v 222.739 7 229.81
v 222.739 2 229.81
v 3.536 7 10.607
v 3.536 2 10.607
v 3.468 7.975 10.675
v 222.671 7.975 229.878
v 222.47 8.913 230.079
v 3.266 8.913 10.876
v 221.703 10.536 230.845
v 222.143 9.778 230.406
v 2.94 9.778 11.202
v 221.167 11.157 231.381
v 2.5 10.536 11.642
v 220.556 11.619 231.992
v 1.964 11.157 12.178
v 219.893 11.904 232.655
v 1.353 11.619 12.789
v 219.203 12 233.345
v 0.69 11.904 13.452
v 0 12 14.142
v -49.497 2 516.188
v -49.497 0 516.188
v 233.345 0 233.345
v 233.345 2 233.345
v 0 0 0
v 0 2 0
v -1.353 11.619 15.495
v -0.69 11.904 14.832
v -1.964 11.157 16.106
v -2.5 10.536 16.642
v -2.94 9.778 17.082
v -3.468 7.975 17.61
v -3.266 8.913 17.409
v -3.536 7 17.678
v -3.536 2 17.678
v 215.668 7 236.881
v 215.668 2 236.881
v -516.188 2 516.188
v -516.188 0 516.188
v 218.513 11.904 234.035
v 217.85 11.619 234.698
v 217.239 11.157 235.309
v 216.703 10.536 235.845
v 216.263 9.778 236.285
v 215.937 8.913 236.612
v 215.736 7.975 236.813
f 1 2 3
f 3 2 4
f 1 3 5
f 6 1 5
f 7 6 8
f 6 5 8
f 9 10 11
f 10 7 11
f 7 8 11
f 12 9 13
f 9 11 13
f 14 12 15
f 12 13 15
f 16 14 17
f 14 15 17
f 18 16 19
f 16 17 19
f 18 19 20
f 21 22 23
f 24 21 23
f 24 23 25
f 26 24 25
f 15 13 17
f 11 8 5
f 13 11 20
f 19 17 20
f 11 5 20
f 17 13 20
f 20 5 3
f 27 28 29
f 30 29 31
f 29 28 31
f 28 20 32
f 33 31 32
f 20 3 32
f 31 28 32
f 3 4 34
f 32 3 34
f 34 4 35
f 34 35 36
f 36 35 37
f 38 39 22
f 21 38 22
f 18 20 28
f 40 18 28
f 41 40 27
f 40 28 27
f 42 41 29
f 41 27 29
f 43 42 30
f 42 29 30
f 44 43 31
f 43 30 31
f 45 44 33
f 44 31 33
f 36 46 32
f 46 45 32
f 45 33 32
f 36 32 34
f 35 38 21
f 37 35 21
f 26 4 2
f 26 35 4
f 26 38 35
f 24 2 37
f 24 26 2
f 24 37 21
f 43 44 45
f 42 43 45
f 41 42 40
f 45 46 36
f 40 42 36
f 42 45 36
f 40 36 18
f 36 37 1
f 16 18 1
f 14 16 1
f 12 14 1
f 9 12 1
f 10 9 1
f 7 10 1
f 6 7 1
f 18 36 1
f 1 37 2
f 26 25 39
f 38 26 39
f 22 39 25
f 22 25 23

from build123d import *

# Parameters (mm, degrees)
BOSS_EXTRUDE1_DEPTH = 2
BOSS_EXTRUDE2_DEPTH = 10
CUT_EXTRUDE1_REACH  = 522
BOSS_EXTRUDE3_DEPTH = 2


with BuildPart() as part:
    # Sketch1 → Boss-Extrude1 (new body)
    with BuildSketch(Plane(origin=(0, 0, 0), x_dir=(1, 0, 0), z_dir=(0, 1, 0))):
        Polygon((-49.497474683, -516.187950266), (233.345237792, -233.345237792), (0, 0), (-282.842712475, -282.842712475), align=None)
    extrude(amount=BOSS_EXTRUDE1_DEPTH)

    # Sketch4 → Boss-Extrude2 (add)
    with BuildSketch(Plane(origin=(0, 2, 0), x_dir=(1, 0, 0), z_dir=(0, 1, 0))):
        Polygon((3.535533906, -10.606601718), (-3.535533906, -17.67766953), (215.667568262, -236.880771697), (222.738636074, -229.809703886), align=None)
    extrude(amount=BOSS_EXTRUDE2_DEPTH)

    # Sketch6 → Cut-Extrude1 (cut, up to next)
    with BuildSketch(Plane(origin=(7.071067812, 0, 7.071067812), x_dir=(-0.707106781, 0, 0.707106781), z_dir=(-0.707106781, 0, -0.707106781)), mode=Mode.PRIVATE) as cut_extrude1_sk1:
        with BuildLine():
            Line((5, 12), (5, 7))
            ThreePointArc((5, 7), (6.464466094, 10.535533906), (10, 12))
            Line((10, 12), (5, 12))
        make_face()
    cut_extrude1_tool1 = extrude(cut_extrude1_sk1.sketch, amount=-CUT_EXTRUDE1_REACH, mode=Mode.PRIVATE) & part.part
    add(cut_extrude1_tool1.solids().sort_by_distance((2.745809, 10.88316, 11.396327))[0], mode=Mode.SUBTRACT)
    # Sketch6 → Cut-Extrude1 (cut, up to next)
    with BuildSketch(Plane(origin=(7.071067812, 0, 7.071067812), x_dir=(-0.707106781, 0, 0.707106781), z_dir=(-0.707106781, 0, -0.707106781)), mode=Mode.PRIVATE) as cut_extrude1_sk2:
        with BuildLine():
            Line((15, 12), (10, 12))
            ThreePointArc((10, 12), (13.535533906, 10.535533906), (15, 7))
            Line((15, 7), (15, 12))
        make_face()
    cut_extrude1_tool2 = extrude(cut_extrude1_sk2.sketch, amount=-CUT_EXTRUDE1_REACH, mode=Mode.PRIVATE) & part.part
    add(cut_extrude1_tool2.solids().sort_by_distance((-2.745809, 10.88316, 16.887945))[0], mode=Mode.SUBTRACT)

    # Sketch10 → Boss-Extrude3 (add)
    with BuildSketch(Plane(origin=(0, 0, 0), x_dir=(1, 0, 0), z_dir=(0, 1, 0))):
        Polygon((-282.842712475, -282.842712475), (-516.187950266, -516.187950266), (-49.497474683, -516.187950266), align=None)
    extrude(amount=BOSS_EXTRUDE3_DEPTH)


solid = part.part
